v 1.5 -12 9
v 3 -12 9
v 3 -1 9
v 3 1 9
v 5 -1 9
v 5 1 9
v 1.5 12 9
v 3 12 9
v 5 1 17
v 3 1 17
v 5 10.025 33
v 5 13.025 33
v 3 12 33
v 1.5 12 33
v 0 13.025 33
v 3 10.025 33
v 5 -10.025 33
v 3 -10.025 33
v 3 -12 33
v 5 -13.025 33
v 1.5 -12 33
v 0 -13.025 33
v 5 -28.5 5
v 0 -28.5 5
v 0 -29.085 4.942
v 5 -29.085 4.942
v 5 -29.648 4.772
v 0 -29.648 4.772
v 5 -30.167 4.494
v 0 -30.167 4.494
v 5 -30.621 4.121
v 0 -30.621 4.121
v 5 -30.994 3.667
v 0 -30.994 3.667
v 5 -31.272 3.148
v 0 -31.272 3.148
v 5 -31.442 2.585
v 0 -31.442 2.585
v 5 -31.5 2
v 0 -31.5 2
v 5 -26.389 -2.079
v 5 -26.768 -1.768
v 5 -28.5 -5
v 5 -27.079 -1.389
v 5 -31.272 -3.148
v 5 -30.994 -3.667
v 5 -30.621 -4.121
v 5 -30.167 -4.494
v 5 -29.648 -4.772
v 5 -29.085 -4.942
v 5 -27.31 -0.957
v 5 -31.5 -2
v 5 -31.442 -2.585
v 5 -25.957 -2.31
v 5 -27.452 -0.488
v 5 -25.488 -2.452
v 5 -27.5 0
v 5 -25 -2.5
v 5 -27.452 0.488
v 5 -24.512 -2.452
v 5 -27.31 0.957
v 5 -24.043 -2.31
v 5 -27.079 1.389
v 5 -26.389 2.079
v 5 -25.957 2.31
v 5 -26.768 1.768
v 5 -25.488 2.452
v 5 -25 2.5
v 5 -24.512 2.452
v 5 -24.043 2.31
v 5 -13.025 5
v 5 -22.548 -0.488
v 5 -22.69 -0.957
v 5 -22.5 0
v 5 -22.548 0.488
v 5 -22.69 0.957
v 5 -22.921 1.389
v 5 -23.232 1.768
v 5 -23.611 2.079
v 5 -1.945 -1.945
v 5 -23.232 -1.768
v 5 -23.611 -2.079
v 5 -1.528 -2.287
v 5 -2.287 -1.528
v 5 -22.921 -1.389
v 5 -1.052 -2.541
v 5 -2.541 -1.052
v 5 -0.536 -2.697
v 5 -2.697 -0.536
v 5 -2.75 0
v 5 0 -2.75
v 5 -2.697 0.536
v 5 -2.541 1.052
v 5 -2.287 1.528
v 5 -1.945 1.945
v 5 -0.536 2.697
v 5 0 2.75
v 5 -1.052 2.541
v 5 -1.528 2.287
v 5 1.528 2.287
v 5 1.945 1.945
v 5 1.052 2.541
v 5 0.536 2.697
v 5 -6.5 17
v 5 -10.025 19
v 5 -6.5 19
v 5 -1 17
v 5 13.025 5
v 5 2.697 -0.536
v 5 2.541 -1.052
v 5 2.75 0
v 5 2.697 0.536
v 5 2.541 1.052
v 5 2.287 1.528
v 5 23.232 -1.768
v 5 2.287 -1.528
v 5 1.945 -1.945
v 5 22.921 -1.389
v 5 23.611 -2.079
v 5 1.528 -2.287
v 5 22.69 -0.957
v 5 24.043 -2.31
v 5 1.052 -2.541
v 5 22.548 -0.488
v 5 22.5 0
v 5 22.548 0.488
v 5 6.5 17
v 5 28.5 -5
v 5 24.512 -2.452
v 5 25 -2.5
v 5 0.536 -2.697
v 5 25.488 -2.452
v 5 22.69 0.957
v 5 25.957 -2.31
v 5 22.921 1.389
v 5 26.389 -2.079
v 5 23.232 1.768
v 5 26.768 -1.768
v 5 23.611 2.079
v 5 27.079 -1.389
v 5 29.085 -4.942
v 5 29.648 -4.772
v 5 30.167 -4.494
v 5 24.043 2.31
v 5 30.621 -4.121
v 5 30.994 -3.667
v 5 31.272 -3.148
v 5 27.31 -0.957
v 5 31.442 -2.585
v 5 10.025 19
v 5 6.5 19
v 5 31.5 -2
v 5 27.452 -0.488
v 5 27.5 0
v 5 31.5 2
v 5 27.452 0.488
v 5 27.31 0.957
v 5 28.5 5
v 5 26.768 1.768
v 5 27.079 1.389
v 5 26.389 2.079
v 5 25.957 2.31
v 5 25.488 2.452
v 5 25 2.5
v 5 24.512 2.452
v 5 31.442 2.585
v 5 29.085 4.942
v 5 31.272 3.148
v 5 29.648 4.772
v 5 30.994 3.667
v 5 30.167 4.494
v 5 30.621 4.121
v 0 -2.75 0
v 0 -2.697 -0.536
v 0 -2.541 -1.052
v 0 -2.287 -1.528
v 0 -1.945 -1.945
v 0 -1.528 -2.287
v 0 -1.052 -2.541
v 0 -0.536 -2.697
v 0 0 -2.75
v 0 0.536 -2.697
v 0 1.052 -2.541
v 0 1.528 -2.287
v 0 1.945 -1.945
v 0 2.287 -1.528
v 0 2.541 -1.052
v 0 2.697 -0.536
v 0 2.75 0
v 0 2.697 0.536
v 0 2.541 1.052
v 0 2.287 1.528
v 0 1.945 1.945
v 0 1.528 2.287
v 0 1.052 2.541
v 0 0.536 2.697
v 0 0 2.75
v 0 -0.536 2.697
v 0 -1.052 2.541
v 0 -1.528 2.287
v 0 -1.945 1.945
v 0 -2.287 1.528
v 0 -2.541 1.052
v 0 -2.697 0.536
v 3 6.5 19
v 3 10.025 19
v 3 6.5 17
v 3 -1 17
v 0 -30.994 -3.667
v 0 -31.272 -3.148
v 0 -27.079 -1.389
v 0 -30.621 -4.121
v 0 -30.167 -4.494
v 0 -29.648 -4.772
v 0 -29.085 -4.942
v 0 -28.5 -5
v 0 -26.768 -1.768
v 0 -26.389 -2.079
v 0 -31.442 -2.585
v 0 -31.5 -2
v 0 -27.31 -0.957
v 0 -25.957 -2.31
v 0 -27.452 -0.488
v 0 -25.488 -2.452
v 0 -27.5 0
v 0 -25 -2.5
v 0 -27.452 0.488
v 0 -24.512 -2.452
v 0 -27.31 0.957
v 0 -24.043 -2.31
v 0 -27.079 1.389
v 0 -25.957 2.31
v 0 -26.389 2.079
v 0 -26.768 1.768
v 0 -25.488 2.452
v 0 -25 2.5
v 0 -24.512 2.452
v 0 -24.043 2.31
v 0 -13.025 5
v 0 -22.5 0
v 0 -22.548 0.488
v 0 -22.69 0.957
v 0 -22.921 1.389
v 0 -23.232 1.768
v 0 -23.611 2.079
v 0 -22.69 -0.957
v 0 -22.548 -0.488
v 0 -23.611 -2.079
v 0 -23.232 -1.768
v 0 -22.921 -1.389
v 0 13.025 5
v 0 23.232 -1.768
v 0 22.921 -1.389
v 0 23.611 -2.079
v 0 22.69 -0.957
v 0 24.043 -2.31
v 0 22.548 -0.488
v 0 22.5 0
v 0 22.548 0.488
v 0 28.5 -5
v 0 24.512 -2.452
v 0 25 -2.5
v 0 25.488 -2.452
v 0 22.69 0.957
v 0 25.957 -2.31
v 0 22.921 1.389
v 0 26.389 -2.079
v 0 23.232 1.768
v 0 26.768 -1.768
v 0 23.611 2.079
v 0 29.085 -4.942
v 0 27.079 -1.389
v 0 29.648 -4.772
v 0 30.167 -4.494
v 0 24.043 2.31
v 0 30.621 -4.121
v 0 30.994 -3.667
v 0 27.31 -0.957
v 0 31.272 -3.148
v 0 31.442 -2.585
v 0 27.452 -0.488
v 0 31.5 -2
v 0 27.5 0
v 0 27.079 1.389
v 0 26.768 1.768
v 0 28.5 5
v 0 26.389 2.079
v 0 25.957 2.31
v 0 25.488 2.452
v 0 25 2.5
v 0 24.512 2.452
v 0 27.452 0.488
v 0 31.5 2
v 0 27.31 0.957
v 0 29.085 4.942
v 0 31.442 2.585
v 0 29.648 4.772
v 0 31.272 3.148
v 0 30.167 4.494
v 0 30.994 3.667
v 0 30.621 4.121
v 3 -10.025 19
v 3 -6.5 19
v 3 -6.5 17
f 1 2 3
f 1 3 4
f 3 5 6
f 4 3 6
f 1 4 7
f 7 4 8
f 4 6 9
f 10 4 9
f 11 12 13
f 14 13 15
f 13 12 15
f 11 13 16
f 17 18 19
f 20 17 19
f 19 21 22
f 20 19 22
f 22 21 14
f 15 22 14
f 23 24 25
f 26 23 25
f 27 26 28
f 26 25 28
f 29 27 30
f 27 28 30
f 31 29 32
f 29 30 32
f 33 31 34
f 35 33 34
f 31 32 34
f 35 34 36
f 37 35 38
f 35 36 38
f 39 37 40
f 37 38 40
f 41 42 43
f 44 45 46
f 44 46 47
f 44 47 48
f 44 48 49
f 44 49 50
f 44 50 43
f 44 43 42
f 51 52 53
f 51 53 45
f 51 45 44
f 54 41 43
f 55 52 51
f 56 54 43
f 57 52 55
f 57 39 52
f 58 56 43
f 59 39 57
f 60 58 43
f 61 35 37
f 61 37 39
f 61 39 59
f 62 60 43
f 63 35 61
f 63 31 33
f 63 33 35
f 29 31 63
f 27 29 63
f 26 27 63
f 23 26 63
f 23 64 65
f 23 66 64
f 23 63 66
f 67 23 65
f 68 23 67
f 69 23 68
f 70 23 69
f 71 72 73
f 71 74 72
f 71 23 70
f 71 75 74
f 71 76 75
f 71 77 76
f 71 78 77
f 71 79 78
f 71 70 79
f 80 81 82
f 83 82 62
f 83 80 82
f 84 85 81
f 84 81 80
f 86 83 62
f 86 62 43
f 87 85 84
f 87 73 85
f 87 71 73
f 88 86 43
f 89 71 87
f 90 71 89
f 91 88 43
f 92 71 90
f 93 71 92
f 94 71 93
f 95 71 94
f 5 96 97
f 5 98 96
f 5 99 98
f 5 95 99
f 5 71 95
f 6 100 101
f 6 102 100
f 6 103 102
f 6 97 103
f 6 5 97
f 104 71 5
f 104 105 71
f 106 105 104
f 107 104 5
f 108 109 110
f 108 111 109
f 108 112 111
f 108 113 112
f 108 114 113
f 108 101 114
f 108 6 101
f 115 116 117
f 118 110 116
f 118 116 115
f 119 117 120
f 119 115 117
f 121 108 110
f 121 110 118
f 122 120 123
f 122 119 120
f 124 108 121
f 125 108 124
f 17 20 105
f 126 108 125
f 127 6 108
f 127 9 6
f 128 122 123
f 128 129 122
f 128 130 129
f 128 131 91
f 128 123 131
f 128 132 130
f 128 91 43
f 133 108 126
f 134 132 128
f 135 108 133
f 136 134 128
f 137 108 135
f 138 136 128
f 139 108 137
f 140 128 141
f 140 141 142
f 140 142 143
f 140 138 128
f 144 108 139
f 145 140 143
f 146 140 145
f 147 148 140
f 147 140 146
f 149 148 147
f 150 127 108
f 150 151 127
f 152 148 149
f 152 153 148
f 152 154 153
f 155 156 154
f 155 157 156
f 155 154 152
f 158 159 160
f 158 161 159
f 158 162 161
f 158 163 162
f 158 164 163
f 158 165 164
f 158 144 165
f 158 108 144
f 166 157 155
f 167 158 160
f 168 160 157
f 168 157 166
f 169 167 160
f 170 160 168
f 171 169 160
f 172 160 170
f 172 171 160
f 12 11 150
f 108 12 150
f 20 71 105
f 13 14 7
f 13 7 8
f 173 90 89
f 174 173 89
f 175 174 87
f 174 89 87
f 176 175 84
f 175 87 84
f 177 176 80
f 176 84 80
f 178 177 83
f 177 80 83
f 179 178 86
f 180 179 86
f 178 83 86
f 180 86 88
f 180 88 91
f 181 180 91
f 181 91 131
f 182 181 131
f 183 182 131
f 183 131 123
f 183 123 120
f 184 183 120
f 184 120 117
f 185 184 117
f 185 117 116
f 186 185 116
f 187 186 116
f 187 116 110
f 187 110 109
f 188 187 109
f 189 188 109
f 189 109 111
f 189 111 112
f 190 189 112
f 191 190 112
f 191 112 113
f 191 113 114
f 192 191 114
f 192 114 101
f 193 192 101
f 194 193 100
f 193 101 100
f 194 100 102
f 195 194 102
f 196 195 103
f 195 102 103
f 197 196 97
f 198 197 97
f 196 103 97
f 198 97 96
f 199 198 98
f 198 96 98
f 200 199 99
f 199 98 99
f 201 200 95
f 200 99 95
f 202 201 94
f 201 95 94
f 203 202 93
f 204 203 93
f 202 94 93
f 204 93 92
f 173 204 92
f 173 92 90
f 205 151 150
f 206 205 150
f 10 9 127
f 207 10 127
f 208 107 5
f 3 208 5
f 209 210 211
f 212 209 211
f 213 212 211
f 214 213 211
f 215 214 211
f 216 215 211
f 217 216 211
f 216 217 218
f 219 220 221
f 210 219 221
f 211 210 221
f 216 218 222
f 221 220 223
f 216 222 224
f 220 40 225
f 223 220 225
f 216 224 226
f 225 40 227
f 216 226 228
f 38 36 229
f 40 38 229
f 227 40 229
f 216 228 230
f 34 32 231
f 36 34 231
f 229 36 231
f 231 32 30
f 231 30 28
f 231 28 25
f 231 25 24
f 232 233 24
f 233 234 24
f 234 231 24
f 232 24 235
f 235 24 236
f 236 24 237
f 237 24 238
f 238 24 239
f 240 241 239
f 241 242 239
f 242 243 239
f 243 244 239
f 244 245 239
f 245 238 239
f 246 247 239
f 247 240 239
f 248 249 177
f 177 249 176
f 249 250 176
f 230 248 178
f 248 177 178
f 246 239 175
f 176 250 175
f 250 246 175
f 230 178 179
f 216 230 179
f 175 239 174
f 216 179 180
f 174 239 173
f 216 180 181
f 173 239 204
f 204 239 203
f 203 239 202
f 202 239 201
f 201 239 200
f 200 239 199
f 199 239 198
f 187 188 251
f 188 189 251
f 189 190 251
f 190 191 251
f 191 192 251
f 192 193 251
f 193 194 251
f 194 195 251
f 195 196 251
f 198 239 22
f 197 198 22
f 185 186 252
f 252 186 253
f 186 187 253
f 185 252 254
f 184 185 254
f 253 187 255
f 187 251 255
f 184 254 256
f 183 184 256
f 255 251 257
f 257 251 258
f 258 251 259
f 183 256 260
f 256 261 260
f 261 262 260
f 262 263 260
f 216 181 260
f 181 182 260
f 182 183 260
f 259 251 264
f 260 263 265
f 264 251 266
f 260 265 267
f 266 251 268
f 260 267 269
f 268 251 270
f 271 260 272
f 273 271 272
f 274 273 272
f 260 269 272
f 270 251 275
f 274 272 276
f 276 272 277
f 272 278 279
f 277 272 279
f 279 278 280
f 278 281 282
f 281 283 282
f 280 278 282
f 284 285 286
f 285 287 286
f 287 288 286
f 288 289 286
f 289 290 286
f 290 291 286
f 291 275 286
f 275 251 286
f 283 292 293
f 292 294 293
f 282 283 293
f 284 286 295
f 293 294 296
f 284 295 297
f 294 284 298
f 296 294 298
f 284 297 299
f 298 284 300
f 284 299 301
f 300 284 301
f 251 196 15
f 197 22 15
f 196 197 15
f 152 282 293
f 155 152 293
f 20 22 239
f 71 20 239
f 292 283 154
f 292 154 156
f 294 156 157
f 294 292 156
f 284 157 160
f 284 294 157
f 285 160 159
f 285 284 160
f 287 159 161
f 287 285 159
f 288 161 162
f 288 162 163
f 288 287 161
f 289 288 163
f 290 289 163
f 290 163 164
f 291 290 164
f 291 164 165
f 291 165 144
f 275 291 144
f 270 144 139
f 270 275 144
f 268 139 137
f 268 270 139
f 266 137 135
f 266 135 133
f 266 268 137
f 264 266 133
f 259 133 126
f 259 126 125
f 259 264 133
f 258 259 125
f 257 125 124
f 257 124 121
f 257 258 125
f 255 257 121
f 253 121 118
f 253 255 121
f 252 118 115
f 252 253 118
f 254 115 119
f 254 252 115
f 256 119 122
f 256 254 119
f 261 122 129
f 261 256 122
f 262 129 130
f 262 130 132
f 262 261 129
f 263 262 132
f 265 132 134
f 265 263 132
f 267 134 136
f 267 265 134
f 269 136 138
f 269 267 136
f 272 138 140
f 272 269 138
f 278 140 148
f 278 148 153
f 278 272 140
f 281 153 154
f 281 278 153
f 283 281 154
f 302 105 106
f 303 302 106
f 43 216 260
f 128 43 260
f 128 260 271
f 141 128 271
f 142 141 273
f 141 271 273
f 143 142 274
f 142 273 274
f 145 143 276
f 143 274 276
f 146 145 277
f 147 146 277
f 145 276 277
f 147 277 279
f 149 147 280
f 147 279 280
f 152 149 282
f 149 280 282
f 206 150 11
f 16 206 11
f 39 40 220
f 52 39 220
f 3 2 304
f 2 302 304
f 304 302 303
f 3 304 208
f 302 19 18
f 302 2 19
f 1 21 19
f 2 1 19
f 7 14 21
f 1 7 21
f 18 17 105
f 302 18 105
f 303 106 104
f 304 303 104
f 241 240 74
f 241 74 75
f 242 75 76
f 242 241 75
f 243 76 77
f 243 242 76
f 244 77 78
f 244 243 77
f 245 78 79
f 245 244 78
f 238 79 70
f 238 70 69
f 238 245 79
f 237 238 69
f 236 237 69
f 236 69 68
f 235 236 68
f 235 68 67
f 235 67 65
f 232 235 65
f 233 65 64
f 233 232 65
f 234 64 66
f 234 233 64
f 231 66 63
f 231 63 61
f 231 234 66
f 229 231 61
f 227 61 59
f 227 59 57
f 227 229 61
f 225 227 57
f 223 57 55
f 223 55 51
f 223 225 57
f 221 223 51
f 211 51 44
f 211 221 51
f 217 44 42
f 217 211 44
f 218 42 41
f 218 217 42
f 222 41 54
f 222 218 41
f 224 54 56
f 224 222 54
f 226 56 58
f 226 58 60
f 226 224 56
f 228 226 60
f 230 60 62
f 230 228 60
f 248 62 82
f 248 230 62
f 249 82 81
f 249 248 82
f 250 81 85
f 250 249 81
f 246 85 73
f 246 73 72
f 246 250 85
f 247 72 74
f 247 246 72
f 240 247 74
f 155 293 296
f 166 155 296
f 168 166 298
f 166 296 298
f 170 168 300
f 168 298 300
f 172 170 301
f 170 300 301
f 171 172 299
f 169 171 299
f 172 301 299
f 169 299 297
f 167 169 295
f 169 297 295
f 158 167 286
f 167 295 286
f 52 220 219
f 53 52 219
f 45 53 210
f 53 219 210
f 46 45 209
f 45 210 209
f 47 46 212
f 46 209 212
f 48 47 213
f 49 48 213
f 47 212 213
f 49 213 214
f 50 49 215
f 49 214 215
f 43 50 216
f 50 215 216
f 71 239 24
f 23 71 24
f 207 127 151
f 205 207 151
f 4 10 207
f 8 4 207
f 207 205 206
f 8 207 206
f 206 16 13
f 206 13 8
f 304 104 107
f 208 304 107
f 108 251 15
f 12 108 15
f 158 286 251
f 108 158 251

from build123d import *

# Parameters (mm, degrees)
F0_R     = 2.5
F1_DEPTH = 5
F2_D     = 5.5
F2_DEPTH = 7
F2_TIP   = 1.6523667023
F4_DEPTH = 5
F6_DEPTH = 3.5
F7_W     = 1.5
F7_H     = 1.975
F8_DEPTH = 24


with BuildPart() as f1:
    # F0 (on Right) → F1 (new body)
    with BuildSketch(Plane.YZ):
        with BuildLine():
            Line((-28.5, -5), (28.5, -5))
            ThreePointArc((28.5, -5), (30.6213203436, -4.1213203436), (31.5, -2))
            Line((31.5, -2), (31.5, 2))
            ThreePointArc((31.5, 2), (30.6213203436, 4.1213203436), (28.5, 5))
            Line((28.5, 5), (-28.5, 5))
            ThreePointArc((-28.5, 5), (-30.6213203436, 4.1213203436), (-31.5, 2))
            Line((-31.5, 2), (-31.5, -2))
            ThreePointArc((-31.5, -2), (-30.6213203436, -4.1213203436), (-28.5, -5))
        make_face()
        with Locations((-25, 0)):
            Circle(F0_R, mode=Mode.SUBTRACT)
        with Locations((25, 0)):
            Circle(F0_R, mode=Mode.SUBTRACT)
    extrude(amount=F1_DEPTH)

    # F2
    with Locations(Plane(origin=(0, 0, 0), x_dir=(0, 1, 0), z_dir=(-1, 0, 0))):
        with Locations((0, 0)):
            Hole(F2_D / 2, depth=F2_DEPTH)
            with Locations((0, 0, -(F2_DEPTH + F2_TIP / 2))):  # 118° drill point
                Cone(0, F2_D / 2, F2_TIP, mode=Mode.SUBTRACT)

    # F3 (on Right) → F4 (join, through all)
    with BuildSketch(Plane.YZ):
        Polygon((-13.025, 33), (-13.025, 5), (13.025, 5), (13.025, 33), (0, 33), align=None)
    extrude(amount=F4_DEPTH)

    # F5 (on face) → F6 (cut)
    with BuildSketch(Plane.YZ.offset(5)):
        Polygon((10.025, 33), (-10.025, 33), (-10.025, 19), (-6.5, 19), (-6.5, 17), (-1, 17), (-1, 9), (1, 9), (1, 17), (6.5, 17), (6.5, 19), (10.025, 19), align=None)
    extrude(amount=-F6_DEPTH, mode=Mode.SUBTRACT)

    # F7 (on face) → F8 (cut, through all)
    with BuildSketch(Plane.XY.offset(33)):
        Polygon((1.5, 10.025), (1.5, 0), (1.5, -10.025), (3, -10.025), (3, 0), (3, 10.025), align=None)
        with Locations((2.25, -11.0125)):
            Rectangle(F7_W, F7_H)
        with Locations((2.25, 11.0125)):
            Rectangle(F7_W, F7_H)
    extrude(amount=-F8_DEPTH, mode=Mode.SUBTRACT)


solid = f1.part
